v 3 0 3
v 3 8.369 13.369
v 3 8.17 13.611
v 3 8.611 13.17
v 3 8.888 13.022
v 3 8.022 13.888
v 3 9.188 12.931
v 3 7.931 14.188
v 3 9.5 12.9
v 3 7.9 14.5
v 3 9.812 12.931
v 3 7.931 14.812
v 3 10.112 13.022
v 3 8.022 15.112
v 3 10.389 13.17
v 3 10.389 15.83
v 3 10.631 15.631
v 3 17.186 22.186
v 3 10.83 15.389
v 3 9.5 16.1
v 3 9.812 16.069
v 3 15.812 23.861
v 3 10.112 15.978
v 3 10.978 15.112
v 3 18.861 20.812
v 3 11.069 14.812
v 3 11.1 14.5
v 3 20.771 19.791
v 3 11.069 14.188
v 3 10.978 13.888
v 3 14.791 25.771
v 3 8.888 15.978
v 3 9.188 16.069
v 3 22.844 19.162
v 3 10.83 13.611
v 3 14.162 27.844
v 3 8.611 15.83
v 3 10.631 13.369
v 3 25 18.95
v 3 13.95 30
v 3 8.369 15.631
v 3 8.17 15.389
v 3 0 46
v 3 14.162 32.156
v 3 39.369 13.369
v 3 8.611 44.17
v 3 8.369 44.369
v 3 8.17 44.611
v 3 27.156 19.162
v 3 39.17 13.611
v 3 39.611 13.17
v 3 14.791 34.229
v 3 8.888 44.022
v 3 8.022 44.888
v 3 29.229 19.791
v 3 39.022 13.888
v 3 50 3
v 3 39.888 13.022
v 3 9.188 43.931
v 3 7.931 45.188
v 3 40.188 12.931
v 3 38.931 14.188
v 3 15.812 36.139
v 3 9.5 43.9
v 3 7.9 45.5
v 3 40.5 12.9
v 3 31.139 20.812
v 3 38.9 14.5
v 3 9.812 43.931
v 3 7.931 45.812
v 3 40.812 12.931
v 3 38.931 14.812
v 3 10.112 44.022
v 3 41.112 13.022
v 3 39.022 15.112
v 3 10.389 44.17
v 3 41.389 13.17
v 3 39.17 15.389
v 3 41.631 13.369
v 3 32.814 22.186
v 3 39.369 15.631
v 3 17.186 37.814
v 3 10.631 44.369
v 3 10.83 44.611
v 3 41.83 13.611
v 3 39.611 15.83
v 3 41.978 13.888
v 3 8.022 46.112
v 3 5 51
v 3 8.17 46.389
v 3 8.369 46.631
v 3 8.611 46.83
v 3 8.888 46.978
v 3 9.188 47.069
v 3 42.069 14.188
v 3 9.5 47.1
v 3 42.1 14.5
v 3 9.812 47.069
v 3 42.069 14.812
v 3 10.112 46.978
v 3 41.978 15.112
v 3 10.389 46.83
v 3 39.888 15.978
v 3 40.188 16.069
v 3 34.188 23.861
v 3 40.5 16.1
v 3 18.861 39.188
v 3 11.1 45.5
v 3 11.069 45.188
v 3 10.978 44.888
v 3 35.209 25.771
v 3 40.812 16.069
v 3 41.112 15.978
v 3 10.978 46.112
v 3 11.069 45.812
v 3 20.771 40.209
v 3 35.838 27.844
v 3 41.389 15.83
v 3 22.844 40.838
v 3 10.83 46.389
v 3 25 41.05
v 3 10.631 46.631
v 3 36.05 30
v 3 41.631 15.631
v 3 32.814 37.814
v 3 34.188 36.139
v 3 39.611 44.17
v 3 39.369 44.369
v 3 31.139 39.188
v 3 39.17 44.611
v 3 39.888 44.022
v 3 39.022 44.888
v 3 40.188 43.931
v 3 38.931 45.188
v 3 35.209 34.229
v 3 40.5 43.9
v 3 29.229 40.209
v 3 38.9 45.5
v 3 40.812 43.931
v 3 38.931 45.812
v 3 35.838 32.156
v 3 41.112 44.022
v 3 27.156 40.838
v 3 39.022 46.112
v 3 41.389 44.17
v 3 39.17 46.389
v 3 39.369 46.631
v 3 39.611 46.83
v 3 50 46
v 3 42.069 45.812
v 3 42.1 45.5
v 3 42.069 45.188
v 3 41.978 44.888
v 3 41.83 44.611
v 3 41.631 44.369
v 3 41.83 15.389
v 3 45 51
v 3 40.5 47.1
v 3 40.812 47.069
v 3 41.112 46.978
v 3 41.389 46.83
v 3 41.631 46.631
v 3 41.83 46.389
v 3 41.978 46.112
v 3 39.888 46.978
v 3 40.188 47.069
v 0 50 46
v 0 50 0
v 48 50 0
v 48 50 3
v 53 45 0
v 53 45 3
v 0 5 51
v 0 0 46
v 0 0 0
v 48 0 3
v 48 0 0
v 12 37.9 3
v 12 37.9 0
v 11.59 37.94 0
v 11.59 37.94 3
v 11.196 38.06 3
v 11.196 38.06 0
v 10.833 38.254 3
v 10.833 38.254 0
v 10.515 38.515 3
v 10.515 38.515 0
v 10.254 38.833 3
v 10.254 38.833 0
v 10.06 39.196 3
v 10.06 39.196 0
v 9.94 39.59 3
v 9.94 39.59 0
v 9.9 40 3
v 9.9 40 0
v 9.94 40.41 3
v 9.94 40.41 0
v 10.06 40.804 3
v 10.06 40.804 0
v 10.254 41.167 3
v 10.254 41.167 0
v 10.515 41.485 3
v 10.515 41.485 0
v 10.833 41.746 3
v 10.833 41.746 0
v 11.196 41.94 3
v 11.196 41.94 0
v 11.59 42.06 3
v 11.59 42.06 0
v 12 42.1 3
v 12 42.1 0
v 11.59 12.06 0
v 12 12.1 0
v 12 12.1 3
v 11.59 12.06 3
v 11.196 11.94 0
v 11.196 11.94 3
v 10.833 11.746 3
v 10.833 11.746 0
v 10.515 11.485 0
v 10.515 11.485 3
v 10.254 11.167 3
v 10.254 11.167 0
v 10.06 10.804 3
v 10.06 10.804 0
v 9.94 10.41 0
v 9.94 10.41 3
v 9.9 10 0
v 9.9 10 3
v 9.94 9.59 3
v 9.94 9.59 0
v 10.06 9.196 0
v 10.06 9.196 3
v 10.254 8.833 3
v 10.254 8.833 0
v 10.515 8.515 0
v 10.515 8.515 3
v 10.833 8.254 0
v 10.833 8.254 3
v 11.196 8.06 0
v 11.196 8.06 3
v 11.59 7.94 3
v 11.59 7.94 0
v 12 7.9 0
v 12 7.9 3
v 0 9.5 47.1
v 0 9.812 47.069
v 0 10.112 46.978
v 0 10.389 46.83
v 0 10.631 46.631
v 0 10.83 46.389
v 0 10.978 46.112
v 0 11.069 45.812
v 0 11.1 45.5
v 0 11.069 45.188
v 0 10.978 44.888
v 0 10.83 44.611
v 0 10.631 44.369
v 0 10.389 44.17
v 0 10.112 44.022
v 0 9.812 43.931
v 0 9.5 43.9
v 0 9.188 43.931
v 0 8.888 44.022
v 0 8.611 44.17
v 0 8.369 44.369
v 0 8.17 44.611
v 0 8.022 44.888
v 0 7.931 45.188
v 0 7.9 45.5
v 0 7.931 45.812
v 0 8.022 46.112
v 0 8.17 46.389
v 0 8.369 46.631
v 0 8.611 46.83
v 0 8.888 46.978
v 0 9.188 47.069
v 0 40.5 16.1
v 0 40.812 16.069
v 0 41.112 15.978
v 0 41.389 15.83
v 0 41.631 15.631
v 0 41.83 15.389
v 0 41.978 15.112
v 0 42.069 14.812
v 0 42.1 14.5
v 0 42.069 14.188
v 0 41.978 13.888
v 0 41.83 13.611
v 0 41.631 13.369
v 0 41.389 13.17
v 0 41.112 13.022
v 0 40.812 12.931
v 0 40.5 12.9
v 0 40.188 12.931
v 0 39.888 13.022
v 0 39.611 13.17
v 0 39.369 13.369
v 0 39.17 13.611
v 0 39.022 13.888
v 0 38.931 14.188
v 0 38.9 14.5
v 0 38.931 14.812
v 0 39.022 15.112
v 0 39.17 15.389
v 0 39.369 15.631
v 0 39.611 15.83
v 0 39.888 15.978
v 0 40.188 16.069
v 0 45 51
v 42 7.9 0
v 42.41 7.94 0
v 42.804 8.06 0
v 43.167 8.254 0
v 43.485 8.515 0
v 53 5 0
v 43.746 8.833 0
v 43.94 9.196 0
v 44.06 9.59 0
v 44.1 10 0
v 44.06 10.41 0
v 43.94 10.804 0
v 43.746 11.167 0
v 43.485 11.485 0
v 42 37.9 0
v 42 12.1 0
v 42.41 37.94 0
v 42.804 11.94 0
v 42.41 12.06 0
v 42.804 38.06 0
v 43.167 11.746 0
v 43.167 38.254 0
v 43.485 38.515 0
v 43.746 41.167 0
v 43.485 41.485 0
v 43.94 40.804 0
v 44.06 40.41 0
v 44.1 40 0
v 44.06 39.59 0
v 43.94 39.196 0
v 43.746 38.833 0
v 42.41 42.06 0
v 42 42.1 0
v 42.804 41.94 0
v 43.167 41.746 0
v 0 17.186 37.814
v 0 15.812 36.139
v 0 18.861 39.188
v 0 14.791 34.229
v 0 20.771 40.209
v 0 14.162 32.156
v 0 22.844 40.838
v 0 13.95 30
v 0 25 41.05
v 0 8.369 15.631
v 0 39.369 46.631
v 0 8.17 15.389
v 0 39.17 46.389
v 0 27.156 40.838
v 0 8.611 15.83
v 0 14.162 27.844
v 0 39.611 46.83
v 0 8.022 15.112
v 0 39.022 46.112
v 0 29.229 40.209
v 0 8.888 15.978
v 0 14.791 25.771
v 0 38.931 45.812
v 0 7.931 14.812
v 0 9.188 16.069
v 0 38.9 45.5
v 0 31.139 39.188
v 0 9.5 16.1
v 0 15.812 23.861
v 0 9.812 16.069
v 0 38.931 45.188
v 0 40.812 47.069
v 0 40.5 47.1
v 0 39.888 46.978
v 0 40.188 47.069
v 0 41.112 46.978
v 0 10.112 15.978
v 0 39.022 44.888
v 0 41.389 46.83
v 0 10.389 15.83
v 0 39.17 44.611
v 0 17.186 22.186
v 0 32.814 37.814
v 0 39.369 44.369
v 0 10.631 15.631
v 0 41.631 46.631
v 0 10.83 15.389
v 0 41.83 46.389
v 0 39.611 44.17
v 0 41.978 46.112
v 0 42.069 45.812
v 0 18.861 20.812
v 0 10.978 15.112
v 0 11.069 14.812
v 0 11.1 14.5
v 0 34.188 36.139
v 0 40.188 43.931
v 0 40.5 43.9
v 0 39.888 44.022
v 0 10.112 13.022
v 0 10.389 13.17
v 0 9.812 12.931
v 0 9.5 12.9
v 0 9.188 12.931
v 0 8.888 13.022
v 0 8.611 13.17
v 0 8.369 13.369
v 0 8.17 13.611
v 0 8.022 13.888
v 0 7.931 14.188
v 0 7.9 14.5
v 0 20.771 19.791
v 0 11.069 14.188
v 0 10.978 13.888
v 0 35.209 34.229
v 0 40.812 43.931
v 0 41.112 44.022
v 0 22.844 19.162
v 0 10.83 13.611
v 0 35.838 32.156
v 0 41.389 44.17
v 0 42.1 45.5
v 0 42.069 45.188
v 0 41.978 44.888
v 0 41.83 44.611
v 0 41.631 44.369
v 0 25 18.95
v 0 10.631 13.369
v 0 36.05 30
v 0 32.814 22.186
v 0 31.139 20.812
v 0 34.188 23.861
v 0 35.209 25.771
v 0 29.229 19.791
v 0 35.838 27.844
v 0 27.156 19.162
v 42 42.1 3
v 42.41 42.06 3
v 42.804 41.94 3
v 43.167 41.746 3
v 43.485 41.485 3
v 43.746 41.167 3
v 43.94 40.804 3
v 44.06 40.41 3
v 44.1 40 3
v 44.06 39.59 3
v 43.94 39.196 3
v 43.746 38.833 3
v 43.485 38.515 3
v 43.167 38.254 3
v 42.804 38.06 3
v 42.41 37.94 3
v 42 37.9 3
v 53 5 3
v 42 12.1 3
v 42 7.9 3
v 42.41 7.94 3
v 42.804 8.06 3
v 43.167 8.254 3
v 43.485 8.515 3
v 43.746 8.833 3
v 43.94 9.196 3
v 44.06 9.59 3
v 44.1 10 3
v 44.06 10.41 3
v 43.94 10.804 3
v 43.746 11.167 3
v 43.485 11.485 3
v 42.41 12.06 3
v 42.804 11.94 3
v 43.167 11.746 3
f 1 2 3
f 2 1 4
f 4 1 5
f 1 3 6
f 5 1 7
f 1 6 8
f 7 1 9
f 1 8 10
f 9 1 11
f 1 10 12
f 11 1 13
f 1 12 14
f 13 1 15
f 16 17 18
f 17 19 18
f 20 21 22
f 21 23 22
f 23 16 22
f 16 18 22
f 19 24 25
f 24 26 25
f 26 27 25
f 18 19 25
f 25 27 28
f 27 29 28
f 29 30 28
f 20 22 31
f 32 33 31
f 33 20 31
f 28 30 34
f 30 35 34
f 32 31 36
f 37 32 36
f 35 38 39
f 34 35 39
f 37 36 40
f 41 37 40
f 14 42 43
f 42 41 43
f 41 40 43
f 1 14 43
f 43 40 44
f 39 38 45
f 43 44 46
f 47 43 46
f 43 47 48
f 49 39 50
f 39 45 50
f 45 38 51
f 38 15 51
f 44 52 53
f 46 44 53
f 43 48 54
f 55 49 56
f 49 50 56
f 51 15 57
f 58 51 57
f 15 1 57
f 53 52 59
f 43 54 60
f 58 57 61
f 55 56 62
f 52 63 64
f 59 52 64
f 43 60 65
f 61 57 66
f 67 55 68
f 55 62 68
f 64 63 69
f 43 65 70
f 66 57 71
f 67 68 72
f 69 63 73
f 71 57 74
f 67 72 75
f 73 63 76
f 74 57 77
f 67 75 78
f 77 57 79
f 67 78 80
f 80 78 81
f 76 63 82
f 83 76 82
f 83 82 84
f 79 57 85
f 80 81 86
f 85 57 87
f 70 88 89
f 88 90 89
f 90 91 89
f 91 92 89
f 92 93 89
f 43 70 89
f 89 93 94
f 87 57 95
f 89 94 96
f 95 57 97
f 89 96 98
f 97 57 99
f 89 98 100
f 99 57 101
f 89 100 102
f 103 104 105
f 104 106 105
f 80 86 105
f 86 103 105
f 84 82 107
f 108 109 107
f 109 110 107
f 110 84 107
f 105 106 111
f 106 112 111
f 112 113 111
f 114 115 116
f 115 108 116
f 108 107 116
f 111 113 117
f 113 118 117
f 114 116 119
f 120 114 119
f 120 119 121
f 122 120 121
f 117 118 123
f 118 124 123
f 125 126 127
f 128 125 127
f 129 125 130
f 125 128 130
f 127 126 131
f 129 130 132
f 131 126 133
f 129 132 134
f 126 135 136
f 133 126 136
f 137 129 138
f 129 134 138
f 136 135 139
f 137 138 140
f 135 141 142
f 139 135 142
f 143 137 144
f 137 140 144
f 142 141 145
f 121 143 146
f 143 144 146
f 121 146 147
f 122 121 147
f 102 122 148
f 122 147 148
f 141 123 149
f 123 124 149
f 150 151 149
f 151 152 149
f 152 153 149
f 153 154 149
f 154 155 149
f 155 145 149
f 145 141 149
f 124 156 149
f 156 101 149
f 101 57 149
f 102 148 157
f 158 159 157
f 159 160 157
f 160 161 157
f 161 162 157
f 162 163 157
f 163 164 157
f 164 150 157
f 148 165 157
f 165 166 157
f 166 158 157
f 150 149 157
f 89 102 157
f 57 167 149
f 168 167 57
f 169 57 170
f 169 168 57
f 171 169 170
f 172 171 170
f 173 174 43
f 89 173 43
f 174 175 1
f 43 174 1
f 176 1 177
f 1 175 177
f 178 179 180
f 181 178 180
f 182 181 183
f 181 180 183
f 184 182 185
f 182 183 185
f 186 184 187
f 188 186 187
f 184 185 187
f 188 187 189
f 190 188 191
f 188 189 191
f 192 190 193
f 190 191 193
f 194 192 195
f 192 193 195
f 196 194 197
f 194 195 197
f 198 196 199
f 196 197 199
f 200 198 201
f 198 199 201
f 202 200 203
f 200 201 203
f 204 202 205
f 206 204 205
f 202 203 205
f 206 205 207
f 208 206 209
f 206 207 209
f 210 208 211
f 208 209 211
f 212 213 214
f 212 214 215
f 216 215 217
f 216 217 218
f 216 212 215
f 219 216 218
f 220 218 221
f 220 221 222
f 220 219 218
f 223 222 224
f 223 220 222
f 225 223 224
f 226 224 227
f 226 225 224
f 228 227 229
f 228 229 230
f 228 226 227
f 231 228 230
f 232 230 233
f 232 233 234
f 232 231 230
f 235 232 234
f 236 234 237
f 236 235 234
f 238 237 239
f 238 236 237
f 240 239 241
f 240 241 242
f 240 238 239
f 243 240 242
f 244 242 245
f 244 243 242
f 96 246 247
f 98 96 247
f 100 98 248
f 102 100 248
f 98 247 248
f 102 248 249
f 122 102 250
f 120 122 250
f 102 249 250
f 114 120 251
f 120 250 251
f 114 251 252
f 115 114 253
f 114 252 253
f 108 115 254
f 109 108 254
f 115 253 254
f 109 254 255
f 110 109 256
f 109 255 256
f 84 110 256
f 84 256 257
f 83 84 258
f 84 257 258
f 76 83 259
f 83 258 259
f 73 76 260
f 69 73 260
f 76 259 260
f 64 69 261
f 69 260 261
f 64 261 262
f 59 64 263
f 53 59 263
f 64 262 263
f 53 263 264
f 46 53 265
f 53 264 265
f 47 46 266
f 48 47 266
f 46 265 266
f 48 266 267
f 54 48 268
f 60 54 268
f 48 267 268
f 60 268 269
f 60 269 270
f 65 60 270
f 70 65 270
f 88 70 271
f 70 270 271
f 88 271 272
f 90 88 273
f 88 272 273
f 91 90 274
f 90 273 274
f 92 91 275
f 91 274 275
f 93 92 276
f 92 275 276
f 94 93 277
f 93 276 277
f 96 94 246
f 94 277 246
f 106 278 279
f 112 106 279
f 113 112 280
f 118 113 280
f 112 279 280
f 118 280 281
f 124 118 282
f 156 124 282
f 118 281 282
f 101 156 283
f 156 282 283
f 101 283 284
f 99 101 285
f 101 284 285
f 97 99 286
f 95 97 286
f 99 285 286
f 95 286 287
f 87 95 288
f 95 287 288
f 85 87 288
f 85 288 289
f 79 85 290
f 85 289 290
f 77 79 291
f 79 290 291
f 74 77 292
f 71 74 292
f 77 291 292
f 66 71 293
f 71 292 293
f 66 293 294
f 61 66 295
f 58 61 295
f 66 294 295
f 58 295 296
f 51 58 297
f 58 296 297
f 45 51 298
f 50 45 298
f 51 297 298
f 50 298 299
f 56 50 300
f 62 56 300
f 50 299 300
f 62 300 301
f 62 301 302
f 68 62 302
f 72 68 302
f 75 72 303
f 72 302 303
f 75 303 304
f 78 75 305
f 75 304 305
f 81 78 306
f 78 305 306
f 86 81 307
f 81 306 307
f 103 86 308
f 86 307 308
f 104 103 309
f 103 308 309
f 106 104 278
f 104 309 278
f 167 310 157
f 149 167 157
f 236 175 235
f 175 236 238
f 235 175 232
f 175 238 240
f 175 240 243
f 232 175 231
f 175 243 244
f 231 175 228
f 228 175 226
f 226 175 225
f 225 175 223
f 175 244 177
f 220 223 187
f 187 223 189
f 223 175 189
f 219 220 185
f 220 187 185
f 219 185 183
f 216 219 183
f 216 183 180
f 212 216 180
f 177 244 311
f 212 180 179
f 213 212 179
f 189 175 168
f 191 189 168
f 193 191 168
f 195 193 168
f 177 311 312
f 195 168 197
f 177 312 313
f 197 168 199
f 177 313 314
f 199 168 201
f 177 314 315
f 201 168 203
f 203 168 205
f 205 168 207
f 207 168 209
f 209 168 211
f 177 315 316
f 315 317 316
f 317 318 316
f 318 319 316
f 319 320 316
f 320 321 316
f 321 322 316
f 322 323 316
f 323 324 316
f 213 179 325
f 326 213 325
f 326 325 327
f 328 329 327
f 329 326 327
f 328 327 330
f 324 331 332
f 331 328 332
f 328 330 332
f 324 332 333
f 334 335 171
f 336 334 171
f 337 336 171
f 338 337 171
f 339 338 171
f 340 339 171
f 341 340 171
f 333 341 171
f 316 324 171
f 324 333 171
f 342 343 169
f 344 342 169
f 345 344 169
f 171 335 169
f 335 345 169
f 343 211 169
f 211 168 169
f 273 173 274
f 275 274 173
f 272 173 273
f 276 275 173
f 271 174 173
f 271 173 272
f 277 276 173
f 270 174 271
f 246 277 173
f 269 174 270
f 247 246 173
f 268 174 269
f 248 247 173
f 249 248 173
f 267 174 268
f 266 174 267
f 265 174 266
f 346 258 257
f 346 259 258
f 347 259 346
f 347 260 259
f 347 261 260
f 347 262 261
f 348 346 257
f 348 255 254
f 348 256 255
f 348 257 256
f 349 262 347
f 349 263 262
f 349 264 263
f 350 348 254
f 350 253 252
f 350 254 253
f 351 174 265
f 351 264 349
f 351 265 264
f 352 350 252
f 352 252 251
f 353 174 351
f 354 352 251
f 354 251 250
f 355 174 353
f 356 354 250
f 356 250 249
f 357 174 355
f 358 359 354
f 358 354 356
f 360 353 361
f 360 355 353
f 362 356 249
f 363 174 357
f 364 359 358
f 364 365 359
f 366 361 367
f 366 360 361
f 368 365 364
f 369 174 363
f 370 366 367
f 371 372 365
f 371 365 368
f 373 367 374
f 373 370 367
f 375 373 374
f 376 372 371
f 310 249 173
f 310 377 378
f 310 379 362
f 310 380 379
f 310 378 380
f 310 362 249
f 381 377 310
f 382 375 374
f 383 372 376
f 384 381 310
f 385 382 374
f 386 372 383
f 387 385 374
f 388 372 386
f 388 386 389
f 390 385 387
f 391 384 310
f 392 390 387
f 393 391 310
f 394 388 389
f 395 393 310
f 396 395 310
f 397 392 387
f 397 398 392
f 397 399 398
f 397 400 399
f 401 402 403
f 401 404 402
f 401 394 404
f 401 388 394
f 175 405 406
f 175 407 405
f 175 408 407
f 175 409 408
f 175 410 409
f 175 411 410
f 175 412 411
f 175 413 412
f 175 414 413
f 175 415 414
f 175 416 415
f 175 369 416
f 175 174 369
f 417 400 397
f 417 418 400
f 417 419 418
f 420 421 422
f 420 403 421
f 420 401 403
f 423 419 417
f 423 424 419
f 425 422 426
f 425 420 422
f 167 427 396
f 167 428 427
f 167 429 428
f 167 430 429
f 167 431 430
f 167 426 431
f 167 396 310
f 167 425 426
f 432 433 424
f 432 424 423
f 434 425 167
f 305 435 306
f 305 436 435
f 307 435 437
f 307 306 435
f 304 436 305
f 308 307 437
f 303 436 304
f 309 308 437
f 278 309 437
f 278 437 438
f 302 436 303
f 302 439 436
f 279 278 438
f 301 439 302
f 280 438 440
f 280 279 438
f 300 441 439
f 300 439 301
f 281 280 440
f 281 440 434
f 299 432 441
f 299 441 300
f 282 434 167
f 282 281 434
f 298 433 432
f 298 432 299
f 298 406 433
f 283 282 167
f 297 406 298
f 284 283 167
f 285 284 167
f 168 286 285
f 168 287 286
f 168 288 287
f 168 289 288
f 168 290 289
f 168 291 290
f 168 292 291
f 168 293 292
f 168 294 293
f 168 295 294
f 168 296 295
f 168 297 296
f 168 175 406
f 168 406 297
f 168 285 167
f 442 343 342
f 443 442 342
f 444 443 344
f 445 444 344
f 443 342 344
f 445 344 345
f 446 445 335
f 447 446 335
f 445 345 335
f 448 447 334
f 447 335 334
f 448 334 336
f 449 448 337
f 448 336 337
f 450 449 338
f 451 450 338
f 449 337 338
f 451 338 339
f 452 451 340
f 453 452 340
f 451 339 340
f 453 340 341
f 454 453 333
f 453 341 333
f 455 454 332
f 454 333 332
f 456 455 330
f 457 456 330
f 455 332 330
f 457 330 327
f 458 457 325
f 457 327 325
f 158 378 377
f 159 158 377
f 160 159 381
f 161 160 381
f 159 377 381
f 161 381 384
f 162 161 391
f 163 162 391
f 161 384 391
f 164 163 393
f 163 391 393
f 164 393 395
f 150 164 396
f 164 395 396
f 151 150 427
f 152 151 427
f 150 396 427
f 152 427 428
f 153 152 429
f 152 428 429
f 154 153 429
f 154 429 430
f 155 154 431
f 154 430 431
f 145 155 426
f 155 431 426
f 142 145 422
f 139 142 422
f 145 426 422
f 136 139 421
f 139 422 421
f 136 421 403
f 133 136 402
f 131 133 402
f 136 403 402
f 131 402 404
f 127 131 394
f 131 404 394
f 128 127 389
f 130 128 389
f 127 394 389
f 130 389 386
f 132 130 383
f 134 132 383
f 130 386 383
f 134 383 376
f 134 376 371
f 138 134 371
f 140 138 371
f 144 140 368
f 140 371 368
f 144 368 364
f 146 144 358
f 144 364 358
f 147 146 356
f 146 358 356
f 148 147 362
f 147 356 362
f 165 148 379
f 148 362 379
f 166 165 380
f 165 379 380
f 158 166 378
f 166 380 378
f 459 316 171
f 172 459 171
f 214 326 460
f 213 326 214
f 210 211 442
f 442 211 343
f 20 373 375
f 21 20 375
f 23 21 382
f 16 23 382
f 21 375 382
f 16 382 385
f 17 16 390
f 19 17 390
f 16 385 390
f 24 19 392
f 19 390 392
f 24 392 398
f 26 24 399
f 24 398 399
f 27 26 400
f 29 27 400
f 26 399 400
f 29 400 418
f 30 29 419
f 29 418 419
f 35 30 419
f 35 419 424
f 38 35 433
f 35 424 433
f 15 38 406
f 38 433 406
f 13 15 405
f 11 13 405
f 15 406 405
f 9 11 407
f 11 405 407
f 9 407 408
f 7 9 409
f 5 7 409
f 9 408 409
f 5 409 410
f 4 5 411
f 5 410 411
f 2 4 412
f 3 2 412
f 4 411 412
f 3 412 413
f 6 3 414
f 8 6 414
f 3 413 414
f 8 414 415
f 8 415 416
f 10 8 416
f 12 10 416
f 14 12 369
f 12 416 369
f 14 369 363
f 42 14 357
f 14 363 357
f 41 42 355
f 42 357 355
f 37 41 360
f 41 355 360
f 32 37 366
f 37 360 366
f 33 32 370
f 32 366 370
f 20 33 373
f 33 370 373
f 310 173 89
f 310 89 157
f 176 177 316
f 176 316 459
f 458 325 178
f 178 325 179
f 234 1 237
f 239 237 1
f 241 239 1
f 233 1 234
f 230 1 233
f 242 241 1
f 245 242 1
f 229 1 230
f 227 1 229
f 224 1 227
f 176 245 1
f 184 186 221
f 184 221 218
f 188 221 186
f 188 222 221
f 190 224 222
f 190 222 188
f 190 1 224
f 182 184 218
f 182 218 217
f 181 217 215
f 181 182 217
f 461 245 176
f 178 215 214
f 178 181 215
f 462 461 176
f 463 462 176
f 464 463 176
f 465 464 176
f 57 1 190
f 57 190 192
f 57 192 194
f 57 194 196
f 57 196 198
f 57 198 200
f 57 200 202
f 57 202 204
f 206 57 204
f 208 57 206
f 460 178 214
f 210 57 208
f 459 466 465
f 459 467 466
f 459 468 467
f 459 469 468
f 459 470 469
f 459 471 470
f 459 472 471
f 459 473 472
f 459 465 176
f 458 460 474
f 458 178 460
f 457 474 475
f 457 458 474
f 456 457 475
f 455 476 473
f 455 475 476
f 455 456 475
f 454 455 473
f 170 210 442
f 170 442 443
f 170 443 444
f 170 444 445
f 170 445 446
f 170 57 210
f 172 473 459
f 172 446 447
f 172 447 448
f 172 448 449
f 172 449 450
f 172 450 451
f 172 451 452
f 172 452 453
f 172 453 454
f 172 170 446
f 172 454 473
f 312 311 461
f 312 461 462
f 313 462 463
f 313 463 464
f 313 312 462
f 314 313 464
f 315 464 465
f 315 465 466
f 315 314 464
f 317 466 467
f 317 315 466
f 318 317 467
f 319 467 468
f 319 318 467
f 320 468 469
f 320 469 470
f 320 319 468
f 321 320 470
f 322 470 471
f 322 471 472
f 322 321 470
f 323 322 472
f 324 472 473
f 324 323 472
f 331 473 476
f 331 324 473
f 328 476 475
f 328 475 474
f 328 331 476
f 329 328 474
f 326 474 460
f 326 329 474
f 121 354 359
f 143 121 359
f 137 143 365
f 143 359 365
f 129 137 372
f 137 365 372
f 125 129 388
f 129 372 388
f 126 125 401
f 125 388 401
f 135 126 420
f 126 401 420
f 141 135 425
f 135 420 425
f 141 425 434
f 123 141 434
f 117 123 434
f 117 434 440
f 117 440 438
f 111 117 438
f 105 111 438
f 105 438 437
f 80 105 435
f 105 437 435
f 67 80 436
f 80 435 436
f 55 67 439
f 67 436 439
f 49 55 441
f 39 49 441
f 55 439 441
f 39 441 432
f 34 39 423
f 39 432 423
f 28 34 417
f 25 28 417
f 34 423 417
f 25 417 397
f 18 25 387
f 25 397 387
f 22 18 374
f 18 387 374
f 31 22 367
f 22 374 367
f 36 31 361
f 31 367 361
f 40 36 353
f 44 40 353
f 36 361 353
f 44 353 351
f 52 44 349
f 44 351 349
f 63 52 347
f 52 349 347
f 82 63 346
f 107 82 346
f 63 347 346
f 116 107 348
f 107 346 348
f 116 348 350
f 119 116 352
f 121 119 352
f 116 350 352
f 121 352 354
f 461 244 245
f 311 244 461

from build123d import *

# Parameters (mm, degrees)
SKETCH_1_W      = 53
SKETCH_1_H      = 50
EXTRUDE_1_DEPTH = 3
SKETCH_2_W      = 51
SKETCH_2_H      = 50
SKETCH_2_R      = 11.05
SKETCH_2_R_2    = 1.6
EXTRUDE_2_DEPTH = 3
CHAMFER_1_SIZE  = 5


with BuildPart() as part:
    # 草图1 → 凸台-拉伸1 (new body)
    with BuildSketch(Plane.XY):
        with Locations((26.5, 25)):
            Rectangle(SKETCH_1_W, SKETCH_1_H)
        with BuildLine():
            Line((12, 42.1), (42, 42.1))
            ThreePointArc((42, 42.1), (44.1, 40), (42, 37.9))
            Line((42, 37.9), (12, 37.9))
            ThreePointArc((12, 37.9), (9.9, 40), (12, 42.1))
        make_face(mode=Mode.SUBTRACT)
        with BuildLine():
            Line((12, 7.9), (42, 7.9))
            ThreePointArc((42, 7.9), (44.1, 10), (42, 12.1))
            Line((42, 12.1), (12, 12.1))
            ThreePointArc((12, 12.1), (9.9, 10), (12, 7.9))
        make_face(mode=Mode.SUBTRACT)
    extrude(amount=EXTRUDE_1_DEPTH)

    # 草图2 → 凸台-拉伸2 (add)
    with BuildSketch(Plane.ZY):
        with Locations((25.5, 25)):
            Rectangle(SKETCH_2_W, SKETCH_2_H)
        with Locations((30, 25)):
            Circle(SKETCH_2_R, mode=Mode.SUBTRACT)
        with Locations((45.5, 40.5)):
            Circle(SKETCH_2_R_2, mode=Mode.SUBTRACT)
        with Locations((45.5, 9.5)):
            Circle(SKETCH_2_R_2, mode=Mode.SUBTRACT)
        with Locations((14.5, 9.5)):
            Circle(SKETCH_2_R_2, mode=Mode.SUBTRACT)
        with Locations((14.5, 40.5)):
            Circle(SKETCH_2_R_2, mode=Mode.SUBTRACT)
    extrude(amount=-EXTRUDE_2_DEPTH)

    # 倒角1
    chamfer_1_edges = [part.edges().sort_by_distance(p)[0] for p in [
        (1.5, 0, 51),
        (1.5, 50, 51),
        (53, 50, 1.5),
        (53, 0, 1.5),
    ]]
    chamfer(chamfer_1_edges, length=CHAMFER_1_SIZE)


solid = part.part
